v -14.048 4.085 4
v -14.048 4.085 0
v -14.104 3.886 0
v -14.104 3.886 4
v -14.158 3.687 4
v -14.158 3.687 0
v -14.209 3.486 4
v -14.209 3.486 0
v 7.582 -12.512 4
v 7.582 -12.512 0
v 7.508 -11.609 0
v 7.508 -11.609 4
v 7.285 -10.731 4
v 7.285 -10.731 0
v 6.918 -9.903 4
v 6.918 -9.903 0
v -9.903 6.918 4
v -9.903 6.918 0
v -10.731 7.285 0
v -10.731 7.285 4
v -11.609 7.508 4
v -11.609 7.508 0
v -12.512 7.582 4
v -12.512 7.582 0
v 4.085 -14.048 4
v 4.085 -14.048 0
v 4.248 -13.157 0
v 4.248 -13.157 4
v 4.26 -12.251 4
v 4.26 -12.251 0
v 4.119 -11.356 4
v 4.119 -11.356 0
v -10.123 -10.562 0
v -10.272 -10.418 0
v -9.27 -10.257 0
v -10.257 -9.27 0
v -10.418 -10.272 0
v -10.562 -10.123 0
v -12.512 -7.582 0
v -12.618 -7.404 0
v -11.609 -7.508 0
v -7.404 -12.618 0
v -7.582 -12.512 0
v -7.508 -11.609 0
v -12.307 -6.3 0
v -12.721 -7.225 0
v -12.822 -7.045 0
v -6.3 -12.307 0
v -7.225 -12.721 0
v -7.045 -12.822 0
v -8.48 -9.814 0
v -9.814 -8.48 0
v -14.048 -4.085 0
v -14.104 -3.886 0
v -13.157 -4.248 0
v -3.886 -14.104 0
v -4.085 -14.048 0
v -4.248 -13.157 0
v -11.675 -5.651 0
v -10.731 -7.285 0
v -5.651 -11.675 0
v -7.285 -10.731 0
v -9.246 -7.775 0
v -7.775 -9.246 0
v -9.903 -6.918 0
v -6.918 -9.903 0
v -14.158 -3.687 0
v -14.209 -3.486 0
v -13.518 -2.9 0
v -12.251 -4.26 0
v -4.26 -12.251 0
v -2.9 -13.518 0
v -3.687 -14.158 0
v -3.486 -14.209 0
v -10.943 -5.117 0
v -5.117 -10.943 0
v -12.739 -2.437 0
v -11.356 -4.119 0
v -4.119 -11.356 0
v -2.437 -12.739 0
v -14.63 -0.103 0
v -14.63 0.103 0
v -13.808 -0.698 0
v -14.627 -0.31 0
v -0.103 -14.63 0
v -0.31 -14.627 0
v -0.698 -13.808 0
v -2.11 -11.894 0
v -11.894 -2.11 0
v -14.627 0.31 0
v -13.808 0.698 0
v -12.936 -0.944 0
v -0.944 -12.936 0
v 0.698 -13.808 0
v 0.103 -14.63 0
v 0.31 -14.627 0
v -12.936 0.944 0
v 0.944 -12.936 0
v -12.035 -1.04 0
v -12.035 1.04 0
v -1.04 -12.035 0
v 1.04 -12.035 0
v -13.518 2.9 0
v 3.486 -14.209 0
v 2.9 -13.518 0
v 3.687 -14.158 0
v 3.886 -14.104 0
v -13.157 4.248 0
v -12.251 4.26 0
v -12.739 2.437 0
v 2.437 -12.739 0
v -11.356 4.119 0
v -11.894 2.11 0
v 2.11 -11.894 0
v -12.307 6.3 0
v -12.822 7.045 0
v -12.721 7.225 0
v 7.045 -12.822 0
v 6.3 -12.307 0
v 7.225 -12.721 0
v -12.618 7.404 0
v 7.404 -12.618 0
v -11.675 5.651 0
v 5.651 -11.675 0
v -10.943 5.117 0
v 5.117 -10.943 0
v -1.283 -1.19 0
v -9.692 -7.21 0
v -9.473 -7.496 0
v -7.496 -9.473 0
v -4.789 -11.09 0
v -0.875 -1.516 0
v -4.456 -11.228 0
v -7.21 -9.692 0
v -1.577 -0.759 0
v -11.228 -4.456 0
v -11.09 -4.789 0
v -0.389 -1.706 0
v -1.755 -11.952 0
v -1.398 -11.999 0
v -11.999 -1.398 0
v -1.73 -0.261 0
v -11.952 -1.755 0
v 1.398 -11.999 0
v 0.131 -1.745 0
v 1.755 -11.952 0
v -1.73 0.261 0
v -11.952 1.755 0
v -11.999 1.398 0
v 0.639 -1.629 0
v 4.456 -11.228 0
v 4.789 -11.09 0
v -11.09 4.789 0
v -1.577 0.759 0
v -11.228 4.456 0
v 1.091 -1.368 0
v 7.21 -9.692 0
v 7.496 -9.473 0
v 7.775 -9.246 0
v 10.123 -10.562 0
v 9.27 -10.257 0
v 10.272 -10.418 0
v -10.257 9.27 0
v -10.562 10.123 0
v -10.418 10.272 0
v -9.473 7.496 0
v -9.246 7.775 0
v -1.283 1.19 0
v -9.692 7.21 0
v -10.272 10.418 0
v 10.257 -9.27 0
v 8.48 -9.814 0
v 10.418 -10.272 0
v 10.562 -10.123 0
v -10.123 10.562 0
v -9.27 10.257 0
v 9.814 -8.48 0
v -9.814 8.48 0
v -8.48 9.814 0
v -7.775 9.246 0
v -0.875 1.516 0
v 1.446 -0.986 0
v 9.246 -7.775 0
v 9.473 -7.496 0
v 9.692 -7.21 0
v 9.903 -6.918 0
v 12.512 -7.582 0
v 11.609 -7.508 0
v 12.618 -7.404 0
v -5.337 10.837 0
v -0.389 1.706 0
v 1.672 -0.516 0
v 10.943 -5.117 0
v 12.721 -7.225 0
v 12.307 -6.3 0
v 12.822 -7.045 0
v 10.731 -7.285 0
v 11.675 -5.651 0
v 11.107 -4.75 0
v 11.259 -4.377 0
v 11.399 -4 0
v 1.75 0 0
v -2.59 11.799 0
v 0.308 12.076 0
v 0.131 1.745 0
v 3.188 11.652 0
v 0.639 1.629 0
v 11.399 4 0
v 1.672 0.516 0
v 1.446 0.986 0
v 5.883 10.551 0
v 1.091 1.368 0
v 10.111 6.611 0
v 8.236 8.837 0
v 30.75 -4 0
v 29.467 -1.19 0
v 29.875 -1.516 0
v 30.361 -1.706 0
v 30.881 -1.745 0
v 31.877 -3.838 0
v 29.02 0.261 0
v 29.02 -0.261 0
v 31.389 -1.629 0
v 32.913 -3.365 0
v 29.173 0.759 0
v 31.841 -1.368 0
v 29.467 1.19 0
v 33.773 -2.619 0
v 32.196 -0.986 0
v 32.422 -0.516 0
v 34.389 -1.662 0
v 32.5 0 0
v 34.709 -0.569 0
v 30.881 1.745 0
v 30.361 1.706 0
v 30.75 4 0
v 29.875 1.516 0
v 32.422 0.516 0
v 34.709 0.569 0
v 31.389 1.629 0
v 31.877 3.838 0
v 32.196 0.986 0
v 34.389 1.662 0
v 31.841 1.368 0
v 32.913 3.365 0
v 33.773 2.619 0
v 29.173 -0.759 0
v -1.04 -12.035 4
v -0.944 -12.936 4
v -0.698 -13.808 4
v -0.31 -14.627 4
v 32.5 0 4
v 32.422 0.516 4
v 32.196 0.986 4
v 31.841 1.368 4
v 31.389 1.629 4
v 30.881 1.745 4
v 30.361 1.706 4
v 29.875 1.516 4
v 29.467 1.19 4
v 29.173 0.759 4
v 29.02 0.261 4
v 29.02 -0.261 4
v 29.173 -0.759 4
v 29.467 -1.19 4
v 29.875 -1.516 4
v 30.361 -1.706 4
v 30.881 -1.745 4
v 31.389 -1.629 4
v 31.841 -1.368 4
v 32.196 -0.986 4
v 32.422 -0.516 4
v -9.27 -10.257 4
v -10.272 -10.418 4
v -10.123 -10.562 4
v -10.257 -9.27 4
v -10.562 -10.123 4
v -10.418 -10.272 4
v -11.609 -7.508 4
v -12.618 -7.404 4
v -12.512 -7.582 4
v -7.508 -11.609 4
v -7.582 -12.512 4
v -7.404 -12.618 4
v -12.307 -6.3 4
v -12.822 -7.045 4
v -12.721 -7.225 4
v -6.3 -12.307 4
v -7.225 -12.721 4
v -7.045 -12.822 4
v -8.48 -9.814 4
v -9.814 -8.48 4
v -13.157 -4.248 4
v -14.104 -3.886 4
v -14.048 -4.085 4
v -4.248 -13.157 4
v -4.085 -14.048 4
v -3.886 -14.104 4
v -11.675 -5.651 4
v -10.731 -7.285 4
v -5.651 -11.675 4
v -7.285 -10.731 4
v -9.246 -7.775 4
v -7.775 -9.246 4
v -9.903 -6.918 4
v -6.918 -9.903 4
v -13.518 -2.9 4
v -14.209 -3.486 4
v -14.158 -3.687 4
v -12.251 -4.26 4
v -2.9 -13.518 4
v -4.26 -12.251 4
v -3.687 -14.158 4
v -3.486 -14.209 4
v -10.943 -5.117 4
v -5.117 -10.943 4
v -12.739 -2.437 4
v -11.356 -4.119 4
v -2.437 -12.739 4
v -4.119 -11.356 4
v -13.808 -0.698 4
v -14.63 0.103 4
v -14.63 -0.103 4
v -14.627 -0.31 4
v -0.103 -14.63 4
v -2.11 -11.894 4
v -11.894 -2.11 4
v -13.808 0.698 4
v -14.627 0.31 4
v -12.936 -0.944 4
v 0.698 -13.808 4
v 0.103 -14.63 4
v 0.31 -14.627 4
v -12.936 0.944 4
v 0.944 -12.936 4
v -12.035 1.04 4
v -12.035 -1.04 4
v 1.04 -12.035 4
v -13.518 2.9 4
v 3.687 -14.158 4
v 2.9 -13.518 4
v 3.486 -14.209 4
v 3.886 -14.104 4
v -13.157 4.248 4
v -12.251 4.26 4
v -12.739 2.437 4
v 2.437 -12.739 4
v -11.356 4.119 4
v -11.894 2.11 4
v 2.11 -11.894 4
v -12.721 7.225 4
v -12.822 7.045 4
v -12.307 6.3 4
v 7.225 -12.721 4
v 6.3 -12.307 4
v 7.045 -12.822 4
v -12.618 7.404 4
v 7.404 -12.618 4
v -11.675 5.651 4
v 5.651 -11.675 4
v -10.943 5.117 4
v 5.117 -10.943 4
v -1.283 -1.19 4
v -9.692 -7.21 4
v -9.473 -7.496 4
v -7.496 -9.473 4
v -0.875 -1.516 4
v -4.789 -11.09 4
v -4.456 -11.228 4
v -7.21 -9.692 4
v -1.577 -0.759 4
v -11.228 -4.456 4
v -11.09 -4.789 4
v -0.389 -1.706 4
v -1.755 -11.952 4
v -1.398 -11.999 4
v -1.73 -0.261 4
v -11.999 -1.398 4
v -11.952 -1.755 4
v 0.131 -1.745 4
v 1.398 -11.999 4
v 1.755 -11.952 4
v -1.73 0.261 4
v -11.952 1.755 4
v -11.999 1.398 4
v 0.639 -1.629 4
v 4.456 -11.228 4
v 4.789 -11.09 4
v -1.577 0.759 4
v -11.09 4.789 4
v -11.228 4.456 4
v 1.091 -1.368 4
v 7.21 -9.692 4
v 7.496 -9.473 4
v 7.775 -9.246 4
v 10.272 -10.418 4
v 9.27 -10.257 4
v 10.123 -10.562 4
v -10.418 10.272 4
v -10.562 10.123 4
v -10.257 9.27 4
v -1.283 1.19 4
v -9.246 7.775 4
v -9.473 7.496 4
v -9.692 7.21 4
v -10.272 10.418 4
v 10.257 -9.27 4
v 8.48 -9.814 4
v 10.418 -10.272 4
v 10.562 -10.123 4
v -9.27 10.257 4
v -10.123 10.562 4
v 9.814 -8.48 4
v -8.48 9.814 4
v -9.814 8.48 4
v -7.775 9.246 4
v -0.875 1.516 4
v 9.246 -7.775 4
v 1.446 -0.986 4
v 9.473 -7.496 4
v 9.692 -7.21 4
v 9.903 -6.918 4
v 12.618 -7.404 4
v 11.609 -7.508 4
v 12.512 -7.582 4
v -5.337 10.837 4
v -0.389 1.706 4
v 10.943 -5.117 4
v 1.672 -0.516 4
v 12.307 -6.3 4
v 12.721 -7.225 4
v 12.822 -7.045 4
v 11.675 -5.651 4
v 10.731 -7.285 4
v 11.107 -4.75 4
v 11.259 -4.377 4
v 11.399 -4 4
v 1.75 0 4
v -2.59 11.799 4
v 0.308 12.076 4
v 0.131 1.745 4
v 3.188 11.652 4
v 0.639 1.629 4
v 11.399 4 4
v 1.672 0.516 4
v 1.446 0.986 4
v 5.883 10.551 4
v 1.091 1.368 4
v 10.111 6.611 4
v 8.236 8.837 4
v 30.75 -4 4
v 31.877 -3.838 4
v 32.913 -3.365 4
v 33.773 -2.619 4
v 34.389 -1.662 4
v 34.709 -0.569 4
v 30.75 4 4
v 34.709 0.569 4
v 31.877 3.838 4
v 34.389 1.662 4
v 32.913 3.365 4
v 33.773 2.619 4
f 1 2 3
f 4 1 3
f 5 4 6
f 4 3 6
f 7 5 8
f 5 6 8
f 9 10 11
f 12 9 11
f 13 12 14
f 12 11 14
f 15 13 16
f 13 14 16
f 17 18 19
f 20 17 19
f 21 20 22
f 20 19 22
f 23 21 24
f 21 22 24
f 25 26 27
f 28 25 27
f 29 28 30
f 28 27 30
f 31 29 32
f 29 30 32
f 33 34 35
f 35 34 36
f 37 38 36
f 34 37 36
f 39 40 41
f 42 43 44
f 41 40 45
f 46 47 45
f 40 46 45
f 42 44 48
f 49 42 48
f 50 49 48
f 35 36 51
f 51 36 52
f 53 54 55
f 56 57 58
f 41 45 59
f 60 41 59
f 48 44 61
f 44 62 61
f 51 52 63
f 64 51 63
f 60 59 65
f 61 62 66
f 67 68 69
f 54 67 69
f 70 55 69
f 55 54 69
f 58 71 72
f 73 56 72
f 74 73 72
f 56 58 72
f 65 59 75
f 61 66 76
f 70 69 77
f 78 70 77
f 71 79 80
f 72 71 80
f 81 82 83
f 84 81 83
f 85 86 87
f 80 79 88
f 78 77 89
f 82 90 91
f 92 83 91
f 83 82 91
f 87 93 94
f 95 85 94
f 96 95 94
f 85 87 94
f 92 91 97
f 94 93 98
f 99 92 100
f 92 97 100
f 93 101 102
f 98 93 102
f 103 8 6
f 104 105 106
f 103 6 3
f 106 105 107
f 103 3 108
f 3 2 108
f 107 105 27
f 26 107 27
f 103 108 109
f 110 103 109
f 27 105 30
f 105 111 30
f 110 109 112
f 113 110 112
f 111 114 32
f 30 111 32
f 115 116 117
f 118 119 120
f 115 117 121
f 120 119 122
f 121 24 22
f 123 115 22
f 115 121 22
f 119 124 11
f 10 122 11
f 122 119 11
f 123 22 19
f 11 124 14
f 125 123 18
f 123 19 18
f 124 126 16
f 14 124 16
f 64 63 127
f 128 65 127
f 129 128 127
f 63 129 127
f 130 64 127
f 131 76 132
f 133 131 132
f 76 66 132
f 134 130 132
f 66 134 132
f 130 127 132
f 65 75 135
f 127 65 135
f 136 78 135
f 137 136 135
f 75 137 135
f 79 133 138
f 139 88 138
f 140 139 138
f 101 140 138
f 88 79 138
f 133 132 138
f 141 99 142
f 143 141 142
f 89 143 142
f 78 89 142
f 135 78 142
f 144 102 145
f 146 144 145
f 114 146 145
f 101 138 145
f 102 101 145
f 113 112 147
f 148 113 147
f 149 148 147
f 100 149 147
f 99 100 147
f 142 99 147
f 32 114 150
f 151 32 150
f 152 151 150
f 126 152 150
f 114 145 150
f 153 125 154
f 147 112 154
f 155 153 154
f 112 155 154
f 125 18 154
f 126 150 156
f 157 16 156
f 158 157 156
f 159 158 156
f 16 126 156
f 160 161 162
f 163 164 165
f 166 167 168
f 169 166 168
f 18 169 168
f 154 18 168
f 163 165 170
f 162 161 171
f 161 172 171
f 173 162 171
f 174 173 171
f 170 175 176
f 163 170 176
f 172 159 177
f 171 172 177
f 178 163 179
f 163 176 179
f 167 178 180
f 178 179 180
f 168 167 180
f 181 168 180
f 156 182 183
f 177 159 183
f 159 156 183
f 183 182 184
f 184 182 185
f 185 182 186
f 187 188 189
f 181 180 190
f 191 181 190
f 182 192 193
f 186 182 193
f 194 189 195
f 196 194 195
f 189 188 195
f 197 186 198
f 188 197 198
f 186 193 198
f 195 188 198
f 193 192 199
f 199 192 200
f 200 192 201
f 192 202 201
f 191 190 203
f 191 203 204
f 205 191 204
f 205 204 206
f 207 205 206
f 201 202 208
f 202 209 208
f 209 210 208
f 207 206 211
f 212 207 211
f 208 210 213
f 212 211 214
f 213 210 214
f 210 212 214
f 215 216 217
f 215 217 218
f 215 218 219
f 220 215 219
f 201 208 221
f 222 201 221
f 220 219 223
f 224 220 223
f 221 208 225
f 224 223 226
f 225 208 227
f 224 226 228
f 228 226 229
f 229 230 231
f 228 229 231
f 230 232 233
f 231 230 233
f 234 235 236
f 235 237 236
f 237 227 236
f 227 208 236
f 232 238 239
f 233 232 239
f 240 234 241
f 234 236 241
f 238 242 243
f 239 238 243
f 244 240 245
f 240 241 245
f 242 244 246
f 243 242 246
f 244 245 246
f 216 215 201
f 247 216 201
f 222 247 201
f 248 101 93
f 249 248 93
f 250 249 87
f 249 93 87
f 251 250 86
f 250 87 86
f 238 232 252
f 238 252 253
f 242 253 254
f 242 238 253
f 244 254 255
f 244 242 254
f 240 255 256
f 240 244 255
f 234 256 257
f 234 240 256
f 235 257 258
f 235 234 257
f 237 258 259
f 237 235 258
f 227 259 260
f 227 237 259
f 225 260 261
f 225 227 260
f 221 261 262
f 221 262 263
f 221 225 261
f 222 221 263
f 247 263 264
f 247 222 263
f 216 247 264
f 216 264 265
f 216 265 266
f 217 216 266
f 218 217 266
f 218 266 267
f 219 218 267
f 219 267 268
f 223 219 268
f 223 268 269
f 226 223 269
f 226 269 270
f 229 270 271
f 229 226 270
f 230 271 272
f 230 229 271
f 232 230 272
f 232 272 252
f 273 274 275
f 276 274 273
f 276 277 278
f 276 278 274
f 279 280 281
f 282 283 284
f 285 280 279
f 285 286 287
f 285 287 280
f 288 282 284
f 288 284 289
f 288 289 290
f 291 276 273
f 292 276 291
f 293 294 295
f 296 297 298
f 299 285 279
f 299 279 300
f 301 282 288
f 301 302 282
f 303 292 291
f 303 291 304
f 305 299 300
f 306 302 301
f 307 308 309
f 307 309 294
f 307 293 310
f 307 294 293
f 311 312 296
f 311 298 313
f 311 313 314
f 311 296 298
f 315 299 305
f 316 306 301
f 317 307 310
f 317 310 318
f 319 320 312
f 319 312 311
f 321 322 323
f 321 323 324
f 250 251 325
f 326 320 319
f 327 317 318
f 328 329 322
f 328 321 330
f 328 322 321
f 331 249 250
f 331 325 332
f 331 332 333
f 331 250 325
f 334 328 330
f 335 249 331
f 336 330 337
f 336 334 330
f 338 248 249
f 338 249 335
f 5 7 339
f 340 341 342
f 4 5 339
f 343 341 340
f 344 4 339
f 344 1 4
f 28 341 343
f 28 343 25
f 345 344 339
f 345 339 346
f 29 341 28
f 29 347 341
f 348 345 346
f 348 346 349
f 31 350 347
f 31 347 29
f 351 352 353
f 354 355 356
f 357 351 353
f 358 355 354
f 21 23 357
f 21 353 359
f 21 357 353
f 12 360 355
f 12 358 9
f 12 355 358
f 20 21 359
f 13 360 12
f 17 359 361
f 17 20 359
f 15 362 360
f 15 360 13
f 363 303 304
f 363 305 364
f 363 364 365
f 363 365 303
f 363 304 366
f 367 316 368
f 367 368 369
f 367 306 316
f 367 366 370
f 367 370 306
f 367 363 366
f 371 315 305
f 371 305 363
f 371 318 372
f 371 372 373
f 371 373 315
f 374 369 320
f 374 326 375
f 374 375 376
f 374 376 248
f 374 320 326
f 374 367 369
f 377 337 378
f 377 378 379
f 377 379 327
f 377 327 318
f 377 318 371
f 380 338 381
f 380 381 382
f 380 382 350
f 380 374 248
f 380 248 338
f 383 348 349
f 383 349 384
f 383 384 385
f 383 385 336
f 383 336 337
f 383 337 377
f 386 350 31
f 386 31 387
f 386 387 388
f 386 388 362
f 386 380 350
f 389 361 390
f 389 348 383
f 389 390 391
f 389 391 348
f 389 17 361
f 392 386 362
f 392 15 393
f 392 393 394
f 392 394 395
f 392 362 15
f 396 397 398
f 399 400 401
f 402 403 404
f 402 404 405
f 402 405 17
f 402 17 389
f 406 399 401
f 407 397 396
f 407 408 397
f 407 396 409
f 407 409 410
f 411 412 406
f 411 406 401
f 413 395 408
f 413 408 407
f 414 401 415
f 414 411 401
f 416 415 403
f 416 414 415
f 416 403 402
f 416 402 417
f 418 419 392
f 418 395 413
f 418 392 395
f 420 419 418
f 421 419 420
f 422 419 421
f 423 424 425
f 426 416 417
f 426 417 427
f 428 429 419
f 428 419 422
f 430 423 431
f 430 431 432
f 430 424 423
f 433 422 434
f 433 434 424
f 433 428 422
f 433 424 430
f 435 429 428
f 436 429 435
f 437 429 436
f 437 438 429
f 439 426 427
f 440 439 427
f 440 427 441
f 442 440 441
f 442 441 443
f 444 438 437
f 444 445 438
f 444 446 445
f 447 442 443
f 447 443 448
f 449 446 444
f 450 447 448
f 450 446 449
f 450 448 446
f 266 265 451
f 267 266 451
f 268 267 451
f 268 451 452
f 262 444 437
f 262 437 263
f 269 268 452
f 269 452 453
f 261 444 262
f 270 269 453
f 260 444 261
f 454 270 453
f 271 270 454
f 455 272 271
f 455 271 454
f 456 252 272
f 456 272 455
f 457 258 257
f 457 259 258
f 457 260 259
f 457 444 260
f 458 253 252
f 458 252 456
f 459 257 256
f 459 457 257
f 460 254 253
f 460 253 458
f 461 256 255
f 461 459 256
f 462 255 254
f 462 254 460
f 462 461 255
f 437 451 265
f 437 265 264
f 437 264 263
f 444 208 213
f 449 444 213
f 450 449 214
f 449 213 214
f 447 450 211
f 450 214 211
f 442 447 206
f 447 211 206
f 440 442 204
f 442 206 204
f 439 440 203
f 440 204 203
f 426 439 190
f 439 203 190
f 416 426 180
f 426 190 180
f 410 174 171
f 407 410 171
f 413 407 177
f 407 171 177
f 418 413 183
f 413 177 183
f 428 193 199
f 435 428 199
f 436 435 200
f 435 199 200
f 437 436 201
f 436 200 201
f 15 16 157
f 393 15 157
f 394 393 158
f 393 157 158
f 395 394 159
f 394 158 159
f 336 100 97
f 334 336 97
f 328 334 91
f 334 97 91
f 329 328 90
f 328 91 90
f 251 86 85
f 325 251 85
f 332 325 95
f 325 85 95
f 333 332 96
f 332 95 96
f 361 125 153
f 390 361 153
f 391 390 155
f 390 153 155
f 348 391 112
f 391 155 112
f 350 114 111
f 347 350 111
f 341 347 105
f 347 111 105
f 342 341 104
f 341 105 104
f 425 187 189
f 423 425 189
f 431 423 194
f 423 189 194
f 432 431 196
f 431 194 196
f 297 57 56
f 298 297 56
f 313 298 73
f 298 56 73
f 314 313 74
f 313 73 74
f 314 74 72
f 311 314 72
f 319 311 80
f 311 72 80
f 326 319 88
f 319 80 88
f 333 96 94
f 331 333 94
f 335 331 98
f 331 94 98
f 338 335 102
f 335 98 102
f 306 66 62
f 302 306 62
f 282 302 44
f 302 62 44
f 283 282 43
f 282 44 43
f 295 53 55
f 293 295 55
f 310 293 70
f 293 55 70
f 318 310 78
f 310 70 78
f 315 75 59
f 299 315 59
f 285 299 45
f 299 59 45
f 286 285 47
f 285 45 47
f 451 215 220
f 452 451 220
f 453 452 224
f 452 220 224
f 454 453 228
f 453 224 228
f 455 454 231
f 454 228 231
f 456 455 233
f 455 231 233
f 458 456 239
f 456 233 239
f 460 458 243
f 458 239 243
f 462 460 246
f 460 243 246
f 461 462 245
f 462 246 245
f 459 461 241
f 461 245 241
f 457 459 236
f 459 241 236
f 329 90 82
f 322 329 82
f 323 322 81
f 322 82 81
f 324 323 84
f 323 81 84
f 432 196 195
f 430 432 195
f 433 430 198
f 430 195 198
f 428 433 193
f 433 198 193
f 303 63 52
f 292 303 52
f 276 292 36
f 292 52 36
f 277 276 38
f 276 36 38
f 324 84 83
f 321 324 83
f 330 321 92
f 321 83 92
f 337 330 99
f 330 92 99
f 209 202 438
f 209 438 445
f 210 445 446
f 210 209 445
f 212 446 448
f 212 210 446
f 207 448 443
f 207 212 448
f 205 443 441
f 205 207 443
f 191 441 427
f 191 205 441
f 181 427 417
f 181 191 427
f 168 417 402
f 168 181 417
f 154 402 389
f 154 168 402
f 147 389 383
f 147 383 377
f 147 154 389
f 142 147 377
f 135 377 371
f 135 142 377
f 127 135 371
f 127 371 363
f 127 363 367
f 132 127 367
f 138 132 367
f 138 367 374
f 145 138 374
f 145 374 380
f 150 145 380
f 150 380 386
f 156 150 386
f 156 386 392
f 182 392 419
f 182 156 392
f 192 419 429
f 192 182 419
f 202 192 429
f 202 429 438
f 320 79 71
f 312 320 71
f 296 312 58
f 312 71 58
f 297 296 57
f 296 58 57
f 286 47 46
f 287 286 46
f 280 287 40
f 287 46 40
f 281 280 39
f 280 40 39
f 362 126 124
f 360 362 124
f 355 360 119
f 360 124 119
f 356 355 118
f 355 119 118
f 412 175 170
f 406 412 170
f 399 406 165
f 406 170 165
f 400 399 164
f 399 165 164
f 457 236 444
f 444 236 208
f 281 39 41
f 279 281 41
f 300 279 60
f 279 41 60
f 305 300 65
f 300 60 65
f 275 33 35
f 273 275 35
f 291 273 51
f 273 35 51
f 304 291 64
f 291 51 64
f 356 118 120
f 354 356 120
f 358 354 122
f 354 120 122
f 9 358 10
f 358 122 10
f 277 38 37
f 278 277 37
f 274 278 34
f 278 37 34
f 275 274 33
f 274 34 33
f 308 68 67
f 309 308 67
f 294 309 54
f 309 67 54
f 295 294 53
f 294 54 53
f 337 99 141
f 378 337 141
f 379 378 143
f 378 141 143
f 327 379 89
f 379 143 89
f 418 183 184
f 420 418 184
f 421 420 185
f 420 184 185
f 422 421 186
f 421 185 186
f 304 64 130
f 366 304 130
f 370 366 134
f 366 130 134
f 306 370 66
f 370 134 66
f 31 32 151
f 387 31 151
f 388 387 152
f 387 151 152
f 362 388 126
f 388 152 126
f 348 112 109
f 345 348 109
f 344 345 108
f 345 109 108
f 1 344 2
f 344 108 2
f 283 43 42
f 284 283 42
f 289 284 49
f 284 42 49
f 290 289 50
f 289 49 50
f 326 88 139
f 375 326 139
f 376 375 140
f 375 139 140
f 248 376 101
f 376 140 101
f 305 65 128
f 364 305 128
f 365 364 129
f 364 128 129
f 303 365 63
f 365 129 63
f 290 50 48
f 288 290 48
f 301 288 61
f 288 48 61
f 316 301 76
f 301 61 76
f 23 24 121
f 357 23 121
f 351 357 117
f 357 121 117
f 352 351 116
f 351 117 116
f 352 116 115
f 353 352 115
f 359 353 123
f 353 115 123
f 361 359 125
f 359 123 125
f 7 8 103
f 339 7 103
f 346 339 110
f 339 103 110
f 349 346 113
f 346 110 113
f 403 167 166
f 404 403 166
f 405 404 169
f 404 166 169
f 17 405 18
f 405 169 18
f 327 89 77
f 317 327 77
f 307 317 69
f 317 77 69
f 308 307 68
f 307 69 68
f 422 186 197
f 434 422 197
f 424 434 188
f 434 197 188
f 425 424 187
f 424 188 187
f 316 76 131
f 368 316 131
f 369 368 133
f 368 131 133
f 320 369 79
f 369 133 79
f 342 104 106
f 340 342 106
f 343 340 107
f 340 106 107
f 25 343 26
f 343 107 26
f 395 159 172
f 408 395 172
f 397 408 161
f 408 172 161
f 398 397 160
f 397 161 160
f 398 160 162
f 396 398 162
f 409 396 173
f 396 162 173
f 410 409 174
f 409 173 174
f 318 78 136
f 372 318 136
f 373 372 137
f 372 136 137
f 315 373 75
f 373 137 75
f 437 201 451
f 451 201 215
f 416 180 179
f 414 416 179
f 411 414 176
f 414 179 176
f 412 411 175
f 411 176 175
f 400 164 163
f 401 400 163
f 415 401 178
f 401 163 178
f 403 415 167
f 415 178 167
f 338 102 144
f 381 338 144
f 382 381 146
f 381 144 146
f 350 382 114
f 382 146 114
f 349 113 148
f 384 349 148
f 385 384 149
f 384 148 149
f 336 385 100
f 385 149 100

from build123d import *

# Parameters (mm, degrees)
SKETCH1_R           = 1.75
BOSS_EXTRUDE3_DEPTH = 4


with BuildPart() as part:
    # Sketch1 → Boss-Extrude3 (new body)
    with BuildSketch(Plane.XY):
        with BuildLine():
            ThreePointArc((11.398526221, 4), (3.187763399, 11.651805204), (-7.774744082, 9.245526186))
            ThreePointArc((-7.774744082, 9.245526186), (-8.865739978, 10.052419077), (-10.123446462, 10.561852666))
            ThreePointArc((-10.123446462, 10.561852666), (-10.344972209, 10.344972209), (-10.561852666, 10.123446462))
            ThreePointArc((-10.561852666, 10.123446462), (-10.052419077, 8.865739978), (-9.245526186, 7.774744082))
            ThreePointArc((-9.245526186, 7.774744082), (-9.583708351, 7.353838062), (-9.90274436, 6.918240682))
            ThreePointArc((-9.90274436, 6.918240682), (-11.16540472, 7.415268848), (-12.51210701, 7.581825517))
            ThreePointArc((-12.51210701, 7.581825517), (-12.669951657, 7.315), (-12.82210701, 7.044889767))
            ThreePointArc((-12.82210701, 7.044889767), (-12.004513558, 5.961889707), (-10.94274436, 5.116907842))
            ThreePointArc((-10.94274436, 5.116907842), (-11.160464753, 4.622815863), (-11.355888976, 4.119488508))
            ThreePointArc((-11.355888976, 4.119488508), (-12.704165582, 4.272780301), (-14.048088143, 4.085109489))
            ThreePointArc((-14.048088143, 4.085109489), (-14.131494839, 3.78652263), (-14.208555951, 3.486235477))
            ThreePointArc((-14.208555951, 3.486235477), (-13.138520279, 2.651746506), (-11.89423259, 2.110362789))
            ThreePointArc((-11.89423259, 2.110362789), (-11.976653925, 1.576756402), (-12.035148524, 1.04))
            ThreePointArc((-12.035148524, 1.04), (-13.377158555, 0.839108838), (-14.626715284, 0.31))
            ThreePointArc((-14.626715284, 0.31), (-14.63, 0), (-14.626715284, -0.31))
            ThreePointArc((-14.626715284, -0.31), (-13.377158555, -0.839108838), (-12.035148524, -1.04))
            ThreePointArc((-12.035148524, -1.04), (-11.976653925, -1.576756402), (-11.89423259, -2.110362789))
            ThreePointArc((-11.89423259, -2.110362789), (-13.138520279, -2.651746506), (-14.208555951, -3.486235477))
            ThreePointArc((-14.208555951, -3.486235477), (-14.131494839, -3.78652263), (-14.048088143, -4.085109489))
            ThreePointArc((-14.048088143, -4.085109489), (-12.704165582, -4.272780301), (-11.355888976, -4.119488508))
            ThreePointArc((-11.355888976, -4.119488508), (-11.160464753, -4.622815863), (-10.94274436, -5.116907842))
            ThreePointArc((-10.94274436, -5.116907842), (-12.004513558, -5.961889707), (-12.82210701, -7.044889767))
            ThreePointArc((-12.82210701, -7.044889767), (-12.669951657, -7.315), (-12.51210701, -7.581825517))
            ThreePointArc((-12.51210701, -7.581825517), (-11.16540472, -7.415268848), (-9.90274436, -6.918240682))
            ThreePointArc((-9.90274436, -6.918240682), (-9.583708351, -7.353838062), (-9.245526186, -7.774744082))
            ThreePointArc((-9.245526186, -7.774744082), (-10.052419077, -8.865739978), (-10.561852666, -10.123446462))
            ThreePointArc((-10.561852666, -10.123446462), (-10.344972209, -10.344972209), (-10.123446462, -10.561852666))
            ThreePointArc((-10.123446462, -10.561852666), (-8.865739978, -10.052419077), (-7.774744082, -9.245526186))
            ThreePointArc((-7.774744082, -9.245526186), (-7.353838062, -9.583708351), (-6.918240682, -9.90274436))
            ThreePointArc((-6.918240682, -9.90274436), (-7.415268848, -11.16540472), (-7.581825517, -12.51210701))
            ThreePointArc((-7.581825517, -12.51210701), (-7.315, -12.669951657), (-7.044889767, -12.82210701))
            ThreePointArc((-7.044889767, -12.82210701), (-5.961889707, -12.004513558), (-5.116907842, -10.94274436))
            ThreePointArc((-5.116907842, -10.94274436), (-4.622815863, -11.160464753), (-4.119488508, -11.355888976))
            ThreePointArc((-4.119488508, -11.355888976), (-4.272780301, -12.704165582), (-4.085109489, -14.048088143))
            ThreePointArc((-4.085109489, -14.048088143), (-3.78652263, -14.131494839), (-3.486235477, -14.208555951))
            ThreePointArc((-3.486235477, -14.208555951), (-2.651746506, -13.138520279), (-2.110362789, -11.89423259))
            ThreePointArc((-2.110362789, -11.89423259), (-1.576756402, -11.976653925), (-1.04, -12.035148524))
            ThreePointArc((-1.04, -12.035148524), (-0.839108838, -13.377158555), (-0.31, -14.626715284))
            ThreePointArc((-0.31, -14.626715284), (0, -14.63), (0.31, -14.626715284))
            ThreePointArc((0.31, -14.626715284), (0.839108838, -13.377158555), (1.04, -12.035148524))
            ThreePointArc((1.04, -12.035148524), (1.576756402, -11.976653925), (2.110362789, -11.89423259))
            ThreePointArc((2.110362789, -11.89423259), (2.651746506, -13.138520279), (3.486235477, -14.208555951))
            ThreePointArc((3.486235477, -14.208555951), (3.78652263, -14.131494839), (4.085109489, -14.048088143))
            ThreePointArc((4.085109489, -14.048088143), (4.272780301, -12.704165582), (4.119488508, -11.355888976))
            ThreePointArc((4.119488508, -11.355888976), (4.622815863, -11.160464753), (5.116907842, -10.94274436))
            ThreePointArc((5.116907842, -10.94274436), (5.961889707, -12.004513558), (7.044889767, -12.82210701))
            ThreePointArc((7.044889767, -12.82210701), (7.315, -12.669951657), (7.581825517, -12.51210701))
            ThreePointArc((7.581825517, -12.51210701), (7.415268848, -11.16540472), (6.918240682, -9.90274436))
            ThreePointArc((6.918240682, -9.90274436), (7.353838062, -9.583708351), (7.774744082, -9.245526186))
            ThreePointArc((7.774744082, -9.245526186), (8.865739978, -10.052419077), (10.123446462, -10.561852666))
            ThreePointArc((10.123446462, -10.561852666), (10.344972209, -10.344972209), (10.561852666, -10.123446462))
            ThreePointArc((10.561852666, -10.123446462), (10.052419077, -8.865739978), (9.245526186, -7.774744082))
            ThreePointArc((9.245526186, -7.774744082), (9.583708351, -7.353838062), (9.90274436, -6.918240682))
            ThreePointArc((9.90274436, -6.918240682), (11.16540472, -7.415268848), (12.51210701, -7.581825517))
            ThreePointArc((12.51210701, -7.581825517), (12.669951657, -7.315), (12.82210701, -7.044889767))
            ThreePointArc((12.82210701, -7.044889767), (12.004513558, -5.961889707), (10.94274436, -5.116907842))
            ThreePointArc((10.94274436, -5.116907842), (11.184585981, -4.564146845), (11.398526221, -4))
            Line((11.398526221, -4), (30.75, -4))
            ThreePointArc((30.75, -4), (34.75, 0), (30.75, 4))
            Line((30.75, 4), (11.398526221, 4))
        make_face()
        Circle(SKETCH1_R, mode=Mode.SUBTRACT)
        with Locations((30.75, 0)):
            Circle(SKETCH1_R, mode=Mode.SUBTRACT)
    extrude(amount=BOSS_EXTRUDE3_DEPTH)


solid = part.part
